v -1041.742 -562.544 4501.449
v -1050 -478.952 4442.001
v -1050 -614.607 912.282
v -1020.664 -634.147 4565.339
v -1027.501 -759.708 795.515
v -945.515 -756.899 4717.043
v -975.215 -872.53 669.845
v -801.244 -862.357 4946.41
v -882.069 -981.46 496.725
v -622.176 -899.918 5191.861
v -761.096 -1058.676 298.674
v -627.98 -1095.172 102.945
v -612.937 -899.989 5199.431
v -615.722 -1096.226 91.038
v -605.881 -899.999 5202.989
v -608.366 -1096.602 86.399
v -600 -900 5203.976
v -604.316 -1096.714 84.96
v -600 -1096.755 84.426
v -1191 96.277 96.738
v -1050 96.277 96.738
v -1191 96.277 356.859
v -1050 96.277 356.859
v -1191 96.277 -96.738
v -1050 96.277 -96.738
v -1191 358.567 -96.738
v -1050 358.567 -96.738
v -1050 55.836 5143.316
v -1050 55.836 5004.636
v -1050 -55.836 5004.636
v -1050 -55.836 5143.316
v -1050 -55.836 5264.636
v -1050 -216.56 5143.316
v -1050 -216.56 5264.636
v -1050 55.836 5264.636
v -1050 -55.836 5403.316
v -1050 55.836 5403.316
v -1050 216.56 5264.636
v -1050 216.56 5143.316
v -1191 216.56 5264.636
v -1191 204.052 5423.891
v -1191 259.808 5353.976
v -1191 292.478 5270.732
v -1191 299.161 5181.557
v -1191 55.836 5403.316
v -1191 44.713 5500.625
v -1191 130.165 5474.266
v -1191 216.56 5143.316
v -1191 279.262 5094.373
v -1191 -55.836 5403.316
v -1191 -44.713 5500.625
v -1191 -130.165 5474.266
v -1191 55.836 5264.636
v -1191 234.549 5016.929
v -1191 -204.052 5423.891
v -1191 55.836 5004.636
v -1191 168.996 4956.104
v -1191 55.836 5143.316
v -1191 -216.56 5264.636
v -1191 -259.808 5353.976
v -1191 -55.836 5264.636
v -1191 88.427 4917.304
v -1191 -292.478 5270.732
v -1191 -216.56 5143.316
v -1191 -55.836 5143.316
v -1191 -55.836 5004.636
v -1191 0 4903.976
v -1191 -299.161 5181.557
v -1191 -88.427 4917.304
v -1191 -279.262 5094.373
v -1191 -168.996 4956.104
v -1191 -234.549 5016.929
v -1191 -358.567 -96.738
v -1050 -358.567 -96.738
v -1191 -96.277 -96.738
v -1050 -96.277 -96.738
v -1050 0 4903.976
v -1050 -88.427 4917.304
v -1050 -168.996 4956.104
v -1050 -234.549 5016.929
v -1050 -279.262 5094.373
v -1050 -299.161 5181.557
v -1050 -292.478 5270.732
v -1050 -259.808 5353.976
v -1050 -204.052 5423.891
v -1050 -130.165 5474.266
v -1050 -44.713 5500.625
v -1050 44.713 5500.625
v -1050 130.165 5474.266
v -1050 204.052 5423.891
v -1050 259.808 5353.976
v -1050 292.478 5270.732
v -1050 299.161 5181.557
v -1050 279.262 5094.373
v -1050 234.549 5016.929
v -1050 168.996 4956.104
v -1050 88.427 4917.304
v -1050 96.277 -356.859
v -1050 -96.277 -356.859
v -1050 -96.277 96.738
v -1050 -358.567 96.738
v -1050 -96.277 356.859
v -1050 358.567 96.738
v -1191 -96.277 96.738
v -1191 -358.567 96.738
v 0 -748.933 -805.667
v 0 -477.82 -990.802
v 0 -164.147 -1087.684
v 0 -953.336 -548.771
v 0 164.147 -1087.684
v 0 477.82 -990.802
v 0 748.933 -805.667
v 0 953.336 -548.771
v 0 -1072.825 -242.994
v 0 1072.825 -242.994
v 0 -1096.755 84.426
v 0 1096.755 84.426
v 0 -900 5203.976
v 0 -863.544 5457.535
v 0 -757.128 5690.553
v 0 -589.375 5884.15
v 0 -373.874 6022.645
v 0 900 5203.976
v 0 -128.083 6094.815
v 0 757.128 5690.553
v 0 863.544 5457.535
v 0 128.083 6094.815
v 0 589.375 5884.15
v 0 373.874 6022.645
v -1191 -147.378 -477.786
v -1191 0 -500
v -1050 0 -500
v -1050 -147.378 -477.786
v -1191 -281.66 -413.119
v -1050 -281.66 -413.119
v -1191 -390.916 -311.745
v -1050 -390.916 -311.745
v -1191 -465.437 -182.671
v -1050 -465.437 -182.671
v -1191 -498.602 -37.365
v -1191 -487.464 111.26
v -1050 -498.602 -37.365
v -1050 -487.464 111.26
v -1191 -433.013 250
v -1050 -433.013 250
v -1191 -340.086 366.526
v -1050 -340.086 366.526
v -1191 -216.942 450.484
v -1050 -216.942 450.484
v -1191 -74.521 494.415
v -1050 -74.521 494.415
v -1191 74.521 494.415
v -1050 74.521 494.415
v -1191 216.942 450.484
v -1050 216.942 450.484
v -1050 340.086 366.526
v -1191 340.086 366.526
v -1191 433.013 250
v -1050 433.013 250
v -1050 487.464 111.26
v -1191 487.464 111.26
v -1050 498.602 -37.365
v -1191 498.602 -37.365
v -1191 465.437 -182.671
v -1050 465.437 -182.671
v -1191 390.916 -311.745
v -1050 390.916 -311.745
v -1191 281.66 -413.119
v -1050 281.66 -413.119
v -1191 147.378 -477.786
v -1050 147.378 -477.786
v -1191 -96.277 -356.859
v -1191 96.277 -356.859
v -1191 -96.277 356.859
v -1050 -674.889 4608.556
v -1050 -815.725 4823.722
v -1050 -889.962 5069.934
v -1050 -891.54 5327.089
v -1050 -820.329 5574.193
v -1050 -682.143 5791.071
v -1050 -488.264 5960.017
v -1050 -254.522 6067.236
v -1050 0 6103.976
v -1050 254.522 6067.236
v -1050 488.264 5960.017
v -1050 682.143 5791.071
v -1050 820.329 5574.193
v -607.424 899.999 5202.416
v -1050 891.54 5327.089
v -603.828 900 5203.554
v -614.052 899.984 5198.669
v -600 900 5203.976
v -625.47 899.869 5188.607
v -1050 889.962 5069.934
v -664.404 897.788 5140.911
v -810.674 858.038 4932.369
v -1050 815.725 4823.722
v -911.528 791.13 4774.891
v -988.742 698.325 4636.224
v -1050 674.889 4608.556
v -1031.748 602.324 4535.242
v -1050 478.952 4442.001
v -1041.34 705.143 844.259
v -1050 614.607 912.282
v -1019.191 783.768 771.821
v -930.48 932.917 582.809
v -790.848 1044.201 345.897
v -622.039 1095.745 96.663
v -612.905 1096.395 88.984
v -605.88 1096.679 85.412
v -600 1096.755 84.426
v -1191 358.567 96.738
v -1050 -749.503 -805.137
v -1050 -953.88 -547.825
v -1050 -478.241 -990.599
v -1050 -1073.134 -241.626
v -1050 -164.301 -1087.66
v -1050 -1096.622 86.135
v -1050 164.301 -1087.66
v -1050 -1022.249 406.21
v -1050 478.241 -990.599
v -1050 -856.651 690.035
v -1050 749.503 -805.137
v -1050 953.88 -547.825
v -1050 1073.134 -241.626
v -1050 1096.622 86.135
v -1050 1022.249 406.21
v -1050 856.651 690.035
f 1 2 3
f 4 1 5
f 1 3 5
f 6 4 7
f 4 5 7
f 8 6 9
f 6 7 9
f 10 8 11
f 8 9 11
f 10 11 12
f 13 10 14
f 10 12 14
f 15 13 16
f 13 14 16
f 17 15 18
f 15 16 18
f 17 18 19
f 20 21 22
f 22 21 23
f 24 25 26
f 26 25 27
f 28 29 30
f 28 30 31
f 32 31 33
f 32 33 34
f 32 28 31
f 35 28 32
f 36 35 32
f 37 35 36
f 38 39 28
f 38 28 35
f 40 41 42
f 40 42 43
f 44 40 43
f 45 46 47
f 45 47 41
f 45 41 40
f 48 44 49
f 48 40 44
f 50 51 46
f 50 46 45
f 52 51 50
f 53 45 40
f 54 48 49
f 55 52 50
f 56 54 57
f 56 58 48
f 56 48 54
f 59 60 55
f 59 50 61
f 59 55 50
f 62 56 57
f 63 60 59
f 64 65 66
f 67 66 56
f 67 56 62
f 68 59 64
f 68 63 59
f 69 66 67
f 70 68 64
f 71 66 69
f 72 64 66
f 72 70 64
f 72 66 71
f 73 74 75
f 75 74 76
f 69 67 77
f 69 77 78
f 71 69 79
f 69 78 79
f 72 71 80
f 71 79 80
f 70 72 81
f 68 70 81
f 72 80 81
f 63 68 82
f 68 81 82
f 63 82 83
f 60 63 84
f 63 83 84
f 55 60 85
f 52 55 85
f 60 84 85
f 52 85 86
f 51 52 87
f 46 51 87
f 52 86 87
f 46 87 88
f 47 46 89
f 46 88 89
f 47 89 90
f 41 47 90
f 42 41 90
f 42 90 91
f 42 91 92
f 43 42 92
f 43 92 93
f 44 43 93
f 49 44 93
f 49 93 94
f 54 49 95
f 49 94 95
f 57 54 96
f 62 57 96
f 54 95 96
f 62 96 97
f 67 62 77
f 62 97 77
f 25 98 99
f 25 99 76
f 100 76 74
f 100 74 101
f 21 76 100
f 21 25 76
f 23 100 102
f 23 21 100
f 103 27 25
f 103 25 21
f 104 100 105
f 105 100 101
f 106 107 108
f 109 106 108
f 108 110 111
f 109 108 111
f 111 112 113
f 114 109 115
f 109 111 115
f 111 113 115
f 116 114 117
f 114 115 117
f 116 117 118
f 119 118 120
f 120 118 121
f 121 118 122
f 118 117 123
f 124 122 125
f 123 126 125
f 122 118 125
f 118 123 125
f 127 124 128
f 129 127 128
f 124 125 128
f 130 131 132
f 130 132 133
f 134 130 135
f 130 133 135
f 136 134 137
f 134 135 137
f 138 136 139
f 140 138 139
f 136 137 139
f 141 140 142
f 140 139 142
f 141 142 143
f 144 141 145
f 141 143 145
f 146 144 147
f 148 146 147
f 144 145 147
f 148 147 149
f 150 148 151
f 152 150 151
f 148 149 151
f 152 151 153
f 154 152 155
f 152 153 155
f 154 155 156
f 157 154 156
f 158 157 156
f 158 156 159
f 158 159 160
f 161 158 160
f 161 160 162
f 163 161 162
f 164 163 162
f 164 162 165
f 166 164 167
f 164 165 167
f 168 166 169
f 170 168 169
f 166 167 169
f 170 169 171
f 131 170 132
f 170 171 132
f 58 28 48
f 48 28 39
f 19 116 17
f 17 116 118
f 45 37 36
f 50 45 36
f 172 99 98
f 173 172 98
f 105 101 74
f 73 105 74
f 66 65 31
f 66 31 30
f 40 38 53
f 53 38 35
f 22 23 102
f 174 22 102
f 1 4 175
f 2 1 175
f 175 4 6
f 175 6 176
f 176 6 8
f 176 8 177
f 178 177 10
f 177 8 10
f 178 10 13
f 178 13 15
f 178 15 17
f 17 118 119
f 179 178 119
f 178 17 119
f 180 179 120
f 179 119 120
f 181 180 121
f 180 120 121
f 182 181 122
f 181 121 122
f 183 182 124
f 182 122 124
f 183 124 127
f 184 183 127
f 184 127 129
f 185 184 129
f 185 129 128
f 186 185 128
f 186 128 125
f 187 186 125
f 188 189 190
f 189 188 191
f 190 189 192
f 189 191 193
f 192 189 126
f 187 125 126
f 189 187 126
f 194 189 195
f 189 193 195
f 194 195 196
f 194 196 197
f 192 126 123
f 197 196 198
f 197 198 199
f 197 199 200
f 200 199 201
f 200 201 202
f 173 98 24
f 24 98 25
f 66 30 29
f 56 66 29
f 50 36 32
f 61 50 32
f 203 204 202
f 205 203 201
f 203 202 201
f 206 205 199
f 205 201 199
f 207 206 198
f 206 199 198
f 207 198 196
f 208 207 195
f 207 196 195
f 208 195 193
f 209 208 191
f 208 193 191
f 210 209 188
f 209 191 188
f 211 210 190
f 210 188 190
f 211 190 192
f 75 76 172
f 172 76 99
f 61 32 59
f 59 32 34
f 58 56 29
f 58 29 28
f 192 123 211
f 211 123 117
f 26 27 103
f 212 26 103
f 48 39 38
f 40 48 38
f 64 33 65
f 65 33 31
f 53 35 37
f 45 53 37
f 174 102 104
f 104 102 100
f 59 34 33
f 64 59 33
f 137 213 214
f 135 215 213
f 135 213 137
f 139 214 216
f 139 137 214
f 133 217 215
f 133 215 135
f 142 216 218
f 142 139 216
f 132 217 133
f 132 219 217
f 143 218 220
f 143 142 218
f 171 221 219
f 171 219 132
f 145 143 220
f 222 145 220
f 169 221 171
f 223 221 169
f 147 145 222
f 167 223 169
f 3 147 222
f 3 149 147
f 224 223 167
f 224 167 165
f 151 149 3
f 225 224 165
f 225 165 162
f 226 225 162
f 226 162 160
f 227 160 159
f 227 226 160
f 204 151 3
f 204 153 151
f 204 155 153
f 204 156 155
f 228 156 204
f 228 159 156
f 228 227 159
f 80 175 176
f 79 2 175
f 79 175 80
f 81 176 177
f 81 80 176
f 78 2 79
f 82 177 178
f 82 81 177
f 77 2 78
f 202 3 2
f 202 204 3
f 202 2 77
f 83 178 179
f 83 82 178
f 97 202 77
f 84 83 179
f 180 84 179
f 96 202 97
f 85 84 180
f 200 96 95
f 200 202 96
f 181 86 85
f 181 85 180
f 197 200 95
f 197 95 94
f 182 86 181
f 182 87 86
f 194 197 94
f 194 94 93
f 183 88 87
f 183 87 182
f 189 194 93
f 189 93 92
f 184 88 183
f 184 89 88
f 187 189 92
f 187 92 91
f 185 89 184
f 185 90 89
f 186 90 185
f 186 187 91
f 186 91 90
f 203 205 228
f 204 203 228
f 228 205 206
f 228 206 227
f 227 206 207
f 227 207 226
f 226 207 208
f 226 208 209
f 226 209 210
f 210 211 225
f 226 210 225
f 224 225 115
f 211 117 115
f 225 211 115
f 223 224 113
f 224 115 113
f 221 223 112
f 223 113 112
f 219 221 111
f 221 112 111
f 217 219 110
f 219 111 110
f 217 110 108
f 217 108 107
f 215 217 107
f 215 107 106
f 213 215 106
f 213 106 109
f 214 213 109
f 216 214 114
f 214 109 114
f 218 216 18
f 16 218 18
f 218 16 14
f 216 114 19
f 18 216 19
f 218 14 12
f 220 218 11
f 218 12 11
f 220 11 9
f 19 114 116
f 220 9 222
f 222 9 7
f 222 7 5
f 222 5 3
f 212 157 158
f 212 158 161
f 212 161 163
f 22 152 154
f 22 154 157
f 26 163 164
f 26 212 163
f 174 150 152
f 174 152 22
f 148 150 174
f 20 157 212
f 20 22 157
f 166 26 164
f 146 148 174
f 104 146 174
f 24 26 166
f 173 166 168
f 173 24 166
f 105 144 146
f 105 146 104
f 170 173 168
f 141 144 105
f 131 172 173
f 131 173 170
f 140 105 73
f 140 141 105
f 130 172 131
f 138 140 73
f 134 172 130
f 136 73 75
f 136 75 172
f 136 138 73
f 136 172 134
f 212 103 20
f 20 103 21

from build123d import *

# Parameters (mm, degrees)
BOSS_EXTRUDE11_DEPTH = 1050
FILLET3_R            = 450
FILLET4_R            = 450
SKETCH14_R           = 500
SKETCH14_R_2         = 300
BOSS_EXTRUDE12_DEPTH = 141


with BuildPart() as part:
    # Sketch13 → Boss-Extrude11 (new body)
    with BuildSketch(Plane(origin=(0, 0, 0), x_dir=(0, 0, -1), z_dir=(1, 0, 0))):
        with BuildLine():
            Line((-5203.97578109, 900), (-84.426039545, 1096.755325424))
            ThreePointArc((-84.426039545, 1096.755325424), (1100, 0), (-84.426039545, -1096.755325424))
            Line((-84.426039545, -1096.755325424), (-5203.97578109, -900))
            ThreePointArc((-5203.97578109, -900), (-6103.97578109, 0), (-5203.97578109, 900))
        make_face()
    extrude(amount=-BOSS_EXTRUDE11_DEPTH)

    # Fillet3
    # the kernel refuses this fillet: 450 mm, written as the material it takes off along each edge
    with BuildSketch(Plane(origin=(-1050, 856.795721699, 6328.145870684), x_dir=(1, 0, 0), z_dir=(0, 0.038403802934356995, -0.9992623018608172))) as fillet3_piece_1_section:
        with BuildLine():
            CenterArc((FILLET3_R, FILLET3_R), FILLET3_R, 180, 90)
            Line((0, FILLET3_R), (-FILLET3_R * 0.02, FILLET3_R))
            Line((-FILLET3_R * 0.02, FILLET3_R), (-FILLET3_R * 0.02, -FILLET3_R * 0.02))
            Line((-FILLET3_R * 0.02, -FILLET3_R * 0.02), (FILLET3_R, -FILLET3_R * 0.02))
            Line((FILLET3_R, -FILLET3_R * 0.02), (FILLET3_R, 0))
        make_face()
    fillet3_piece_1 = extrude(amount=7373.329211972, mode=Mode.PRIVATE)
    fillet3_piece_1 = fillet3_piece_1 - Plane(origin=(-939.154222866, 0, 5203.97578109), x_dir=(0, -1, 0), z_dir=(1, 0, 0)) * Cylinder(900, 16547, mode=Mode.PRIVATE)
    fillet3_piece_1 = fillet3_piece_1 - Plane(origin=(-939.154222866, 0, 0), x_dir=(0, 0.9970502958403585, 0.07675094504078517), z_dir=(1, 0, 0)) * Cylinder(1100, 16547, mode=Mode.PRIVATE)
    add(fillet3_piece_1, mode=Mode.SUBTRACT)

    # Fillet4
    # the kernel refuses this fillet: 450 mm, written as the material it takes off along each edge
    with BuildSketch(Plane(origin=(-1050, -1139.959603726, -1039.744050049), x_dir=(1, 0, 0), z_dir=(0, 0.038403802934357, 0.9992623018608173))) as fillet4_piece_1_section:
        with BuildLine():
            CenterArc((FILLET4_R, FILLET4_R), FILLET4_R, 180, 90)
            Line((0, FILLET4_R), (-FILLET4_R * 0.02, FILLET4_R))
            Line((-FILLET4_R * 0.02, FILLET4_R), (-FILLET4_R * 0.02, -FILLET4_R * 0.02))
            Line((-FILLET4_R * 0.02, -FILLET4_R * 0.02), (FILLET4_R, -FILLET4_R * 0.02))
            Line((FILLET4_R, -FILLET4_R * 0.02), (FILLET4_R, 0))
        make_face()
    fillet4_piece_1 = extrude(amount=7373.329211972, mode=Mode.PRIVATE)
    fillet4_piece_1 = fillet4_piece_1 - Plane(origin=(-939.14440513, 0, 0), x_dir=(0, 0.9970502958403585, 0.07675094504078517), z_dir=(1, 0, 0)) * Cylinder(1100, 16547, mode=Mode.PRIVATE)
    fillet4_piece_1 = fillet4_piece_1 - Plane(origin=(-939.14440513, 0, 5203.97578109), x_dir=(0, -1, 0), z_dir=(1, 0, 0)) * Cylinder(900, 16547, mode=Mode.PRIVATE)
    add(fillet4_piece_1, mode=Mode.SUBTRACT)

    # Sketch14 → Boss-Extrude12 (add)
    # profile 1 of 2: a face of its own
    with BuildSketch(Plane.ZY.offset(1050)):
        with Locations(Location((0, 0, 0), (0, 0, 180))):
            Circle(SKETCH14_R)
        Polygon((-96.738028444, 96.277150217), (-96.738028444, 358.567374068), (96.738028444, 358.567374068), (96.738028444, 96.277150217), (356.859091418, 96.277150217), (356.859091418, -96.277150217), (96.738028444, -96.277150217), (96.738028444, -358.567374068), (-96.738028444, -358.567374068), (-96.738028444, -96.277150217), (-356.859091418, -96.277150217), (-356.859091418, 96.277150217), align=None, mode=Mode.SUBTRACT)
    # profile 2 of 2: a face of its own
    with BuildSketch(Plane.ZY.offset(1050)):
        with Locations(Location((5203.97578109, 0, 0), (0, 0, 180))):
            Circle(SKETCH14_R_2)
        Polygon((5264.6356884, 55.836406433), (5403.316008511, 55.836406433), (5403.316008511, -55.836406433), (5264.6356884, -55.836406433), (5264.6356884, -216.560493249), (5143.315873781, -216.560493249), (5143.315873781, -55.836406433), (5004.63555367, -55.836406433), (5004.63555367, 55.836406433), (5143.315873781, 55.836406433), (5143.315873781, 216.560493249), (5264.6356884, 216.560493249), align=None, mode=Mode.SUBTRACT)
    extrude(amount=BOSS_EXTRUDE12_DEPTH)


solid = part.part
